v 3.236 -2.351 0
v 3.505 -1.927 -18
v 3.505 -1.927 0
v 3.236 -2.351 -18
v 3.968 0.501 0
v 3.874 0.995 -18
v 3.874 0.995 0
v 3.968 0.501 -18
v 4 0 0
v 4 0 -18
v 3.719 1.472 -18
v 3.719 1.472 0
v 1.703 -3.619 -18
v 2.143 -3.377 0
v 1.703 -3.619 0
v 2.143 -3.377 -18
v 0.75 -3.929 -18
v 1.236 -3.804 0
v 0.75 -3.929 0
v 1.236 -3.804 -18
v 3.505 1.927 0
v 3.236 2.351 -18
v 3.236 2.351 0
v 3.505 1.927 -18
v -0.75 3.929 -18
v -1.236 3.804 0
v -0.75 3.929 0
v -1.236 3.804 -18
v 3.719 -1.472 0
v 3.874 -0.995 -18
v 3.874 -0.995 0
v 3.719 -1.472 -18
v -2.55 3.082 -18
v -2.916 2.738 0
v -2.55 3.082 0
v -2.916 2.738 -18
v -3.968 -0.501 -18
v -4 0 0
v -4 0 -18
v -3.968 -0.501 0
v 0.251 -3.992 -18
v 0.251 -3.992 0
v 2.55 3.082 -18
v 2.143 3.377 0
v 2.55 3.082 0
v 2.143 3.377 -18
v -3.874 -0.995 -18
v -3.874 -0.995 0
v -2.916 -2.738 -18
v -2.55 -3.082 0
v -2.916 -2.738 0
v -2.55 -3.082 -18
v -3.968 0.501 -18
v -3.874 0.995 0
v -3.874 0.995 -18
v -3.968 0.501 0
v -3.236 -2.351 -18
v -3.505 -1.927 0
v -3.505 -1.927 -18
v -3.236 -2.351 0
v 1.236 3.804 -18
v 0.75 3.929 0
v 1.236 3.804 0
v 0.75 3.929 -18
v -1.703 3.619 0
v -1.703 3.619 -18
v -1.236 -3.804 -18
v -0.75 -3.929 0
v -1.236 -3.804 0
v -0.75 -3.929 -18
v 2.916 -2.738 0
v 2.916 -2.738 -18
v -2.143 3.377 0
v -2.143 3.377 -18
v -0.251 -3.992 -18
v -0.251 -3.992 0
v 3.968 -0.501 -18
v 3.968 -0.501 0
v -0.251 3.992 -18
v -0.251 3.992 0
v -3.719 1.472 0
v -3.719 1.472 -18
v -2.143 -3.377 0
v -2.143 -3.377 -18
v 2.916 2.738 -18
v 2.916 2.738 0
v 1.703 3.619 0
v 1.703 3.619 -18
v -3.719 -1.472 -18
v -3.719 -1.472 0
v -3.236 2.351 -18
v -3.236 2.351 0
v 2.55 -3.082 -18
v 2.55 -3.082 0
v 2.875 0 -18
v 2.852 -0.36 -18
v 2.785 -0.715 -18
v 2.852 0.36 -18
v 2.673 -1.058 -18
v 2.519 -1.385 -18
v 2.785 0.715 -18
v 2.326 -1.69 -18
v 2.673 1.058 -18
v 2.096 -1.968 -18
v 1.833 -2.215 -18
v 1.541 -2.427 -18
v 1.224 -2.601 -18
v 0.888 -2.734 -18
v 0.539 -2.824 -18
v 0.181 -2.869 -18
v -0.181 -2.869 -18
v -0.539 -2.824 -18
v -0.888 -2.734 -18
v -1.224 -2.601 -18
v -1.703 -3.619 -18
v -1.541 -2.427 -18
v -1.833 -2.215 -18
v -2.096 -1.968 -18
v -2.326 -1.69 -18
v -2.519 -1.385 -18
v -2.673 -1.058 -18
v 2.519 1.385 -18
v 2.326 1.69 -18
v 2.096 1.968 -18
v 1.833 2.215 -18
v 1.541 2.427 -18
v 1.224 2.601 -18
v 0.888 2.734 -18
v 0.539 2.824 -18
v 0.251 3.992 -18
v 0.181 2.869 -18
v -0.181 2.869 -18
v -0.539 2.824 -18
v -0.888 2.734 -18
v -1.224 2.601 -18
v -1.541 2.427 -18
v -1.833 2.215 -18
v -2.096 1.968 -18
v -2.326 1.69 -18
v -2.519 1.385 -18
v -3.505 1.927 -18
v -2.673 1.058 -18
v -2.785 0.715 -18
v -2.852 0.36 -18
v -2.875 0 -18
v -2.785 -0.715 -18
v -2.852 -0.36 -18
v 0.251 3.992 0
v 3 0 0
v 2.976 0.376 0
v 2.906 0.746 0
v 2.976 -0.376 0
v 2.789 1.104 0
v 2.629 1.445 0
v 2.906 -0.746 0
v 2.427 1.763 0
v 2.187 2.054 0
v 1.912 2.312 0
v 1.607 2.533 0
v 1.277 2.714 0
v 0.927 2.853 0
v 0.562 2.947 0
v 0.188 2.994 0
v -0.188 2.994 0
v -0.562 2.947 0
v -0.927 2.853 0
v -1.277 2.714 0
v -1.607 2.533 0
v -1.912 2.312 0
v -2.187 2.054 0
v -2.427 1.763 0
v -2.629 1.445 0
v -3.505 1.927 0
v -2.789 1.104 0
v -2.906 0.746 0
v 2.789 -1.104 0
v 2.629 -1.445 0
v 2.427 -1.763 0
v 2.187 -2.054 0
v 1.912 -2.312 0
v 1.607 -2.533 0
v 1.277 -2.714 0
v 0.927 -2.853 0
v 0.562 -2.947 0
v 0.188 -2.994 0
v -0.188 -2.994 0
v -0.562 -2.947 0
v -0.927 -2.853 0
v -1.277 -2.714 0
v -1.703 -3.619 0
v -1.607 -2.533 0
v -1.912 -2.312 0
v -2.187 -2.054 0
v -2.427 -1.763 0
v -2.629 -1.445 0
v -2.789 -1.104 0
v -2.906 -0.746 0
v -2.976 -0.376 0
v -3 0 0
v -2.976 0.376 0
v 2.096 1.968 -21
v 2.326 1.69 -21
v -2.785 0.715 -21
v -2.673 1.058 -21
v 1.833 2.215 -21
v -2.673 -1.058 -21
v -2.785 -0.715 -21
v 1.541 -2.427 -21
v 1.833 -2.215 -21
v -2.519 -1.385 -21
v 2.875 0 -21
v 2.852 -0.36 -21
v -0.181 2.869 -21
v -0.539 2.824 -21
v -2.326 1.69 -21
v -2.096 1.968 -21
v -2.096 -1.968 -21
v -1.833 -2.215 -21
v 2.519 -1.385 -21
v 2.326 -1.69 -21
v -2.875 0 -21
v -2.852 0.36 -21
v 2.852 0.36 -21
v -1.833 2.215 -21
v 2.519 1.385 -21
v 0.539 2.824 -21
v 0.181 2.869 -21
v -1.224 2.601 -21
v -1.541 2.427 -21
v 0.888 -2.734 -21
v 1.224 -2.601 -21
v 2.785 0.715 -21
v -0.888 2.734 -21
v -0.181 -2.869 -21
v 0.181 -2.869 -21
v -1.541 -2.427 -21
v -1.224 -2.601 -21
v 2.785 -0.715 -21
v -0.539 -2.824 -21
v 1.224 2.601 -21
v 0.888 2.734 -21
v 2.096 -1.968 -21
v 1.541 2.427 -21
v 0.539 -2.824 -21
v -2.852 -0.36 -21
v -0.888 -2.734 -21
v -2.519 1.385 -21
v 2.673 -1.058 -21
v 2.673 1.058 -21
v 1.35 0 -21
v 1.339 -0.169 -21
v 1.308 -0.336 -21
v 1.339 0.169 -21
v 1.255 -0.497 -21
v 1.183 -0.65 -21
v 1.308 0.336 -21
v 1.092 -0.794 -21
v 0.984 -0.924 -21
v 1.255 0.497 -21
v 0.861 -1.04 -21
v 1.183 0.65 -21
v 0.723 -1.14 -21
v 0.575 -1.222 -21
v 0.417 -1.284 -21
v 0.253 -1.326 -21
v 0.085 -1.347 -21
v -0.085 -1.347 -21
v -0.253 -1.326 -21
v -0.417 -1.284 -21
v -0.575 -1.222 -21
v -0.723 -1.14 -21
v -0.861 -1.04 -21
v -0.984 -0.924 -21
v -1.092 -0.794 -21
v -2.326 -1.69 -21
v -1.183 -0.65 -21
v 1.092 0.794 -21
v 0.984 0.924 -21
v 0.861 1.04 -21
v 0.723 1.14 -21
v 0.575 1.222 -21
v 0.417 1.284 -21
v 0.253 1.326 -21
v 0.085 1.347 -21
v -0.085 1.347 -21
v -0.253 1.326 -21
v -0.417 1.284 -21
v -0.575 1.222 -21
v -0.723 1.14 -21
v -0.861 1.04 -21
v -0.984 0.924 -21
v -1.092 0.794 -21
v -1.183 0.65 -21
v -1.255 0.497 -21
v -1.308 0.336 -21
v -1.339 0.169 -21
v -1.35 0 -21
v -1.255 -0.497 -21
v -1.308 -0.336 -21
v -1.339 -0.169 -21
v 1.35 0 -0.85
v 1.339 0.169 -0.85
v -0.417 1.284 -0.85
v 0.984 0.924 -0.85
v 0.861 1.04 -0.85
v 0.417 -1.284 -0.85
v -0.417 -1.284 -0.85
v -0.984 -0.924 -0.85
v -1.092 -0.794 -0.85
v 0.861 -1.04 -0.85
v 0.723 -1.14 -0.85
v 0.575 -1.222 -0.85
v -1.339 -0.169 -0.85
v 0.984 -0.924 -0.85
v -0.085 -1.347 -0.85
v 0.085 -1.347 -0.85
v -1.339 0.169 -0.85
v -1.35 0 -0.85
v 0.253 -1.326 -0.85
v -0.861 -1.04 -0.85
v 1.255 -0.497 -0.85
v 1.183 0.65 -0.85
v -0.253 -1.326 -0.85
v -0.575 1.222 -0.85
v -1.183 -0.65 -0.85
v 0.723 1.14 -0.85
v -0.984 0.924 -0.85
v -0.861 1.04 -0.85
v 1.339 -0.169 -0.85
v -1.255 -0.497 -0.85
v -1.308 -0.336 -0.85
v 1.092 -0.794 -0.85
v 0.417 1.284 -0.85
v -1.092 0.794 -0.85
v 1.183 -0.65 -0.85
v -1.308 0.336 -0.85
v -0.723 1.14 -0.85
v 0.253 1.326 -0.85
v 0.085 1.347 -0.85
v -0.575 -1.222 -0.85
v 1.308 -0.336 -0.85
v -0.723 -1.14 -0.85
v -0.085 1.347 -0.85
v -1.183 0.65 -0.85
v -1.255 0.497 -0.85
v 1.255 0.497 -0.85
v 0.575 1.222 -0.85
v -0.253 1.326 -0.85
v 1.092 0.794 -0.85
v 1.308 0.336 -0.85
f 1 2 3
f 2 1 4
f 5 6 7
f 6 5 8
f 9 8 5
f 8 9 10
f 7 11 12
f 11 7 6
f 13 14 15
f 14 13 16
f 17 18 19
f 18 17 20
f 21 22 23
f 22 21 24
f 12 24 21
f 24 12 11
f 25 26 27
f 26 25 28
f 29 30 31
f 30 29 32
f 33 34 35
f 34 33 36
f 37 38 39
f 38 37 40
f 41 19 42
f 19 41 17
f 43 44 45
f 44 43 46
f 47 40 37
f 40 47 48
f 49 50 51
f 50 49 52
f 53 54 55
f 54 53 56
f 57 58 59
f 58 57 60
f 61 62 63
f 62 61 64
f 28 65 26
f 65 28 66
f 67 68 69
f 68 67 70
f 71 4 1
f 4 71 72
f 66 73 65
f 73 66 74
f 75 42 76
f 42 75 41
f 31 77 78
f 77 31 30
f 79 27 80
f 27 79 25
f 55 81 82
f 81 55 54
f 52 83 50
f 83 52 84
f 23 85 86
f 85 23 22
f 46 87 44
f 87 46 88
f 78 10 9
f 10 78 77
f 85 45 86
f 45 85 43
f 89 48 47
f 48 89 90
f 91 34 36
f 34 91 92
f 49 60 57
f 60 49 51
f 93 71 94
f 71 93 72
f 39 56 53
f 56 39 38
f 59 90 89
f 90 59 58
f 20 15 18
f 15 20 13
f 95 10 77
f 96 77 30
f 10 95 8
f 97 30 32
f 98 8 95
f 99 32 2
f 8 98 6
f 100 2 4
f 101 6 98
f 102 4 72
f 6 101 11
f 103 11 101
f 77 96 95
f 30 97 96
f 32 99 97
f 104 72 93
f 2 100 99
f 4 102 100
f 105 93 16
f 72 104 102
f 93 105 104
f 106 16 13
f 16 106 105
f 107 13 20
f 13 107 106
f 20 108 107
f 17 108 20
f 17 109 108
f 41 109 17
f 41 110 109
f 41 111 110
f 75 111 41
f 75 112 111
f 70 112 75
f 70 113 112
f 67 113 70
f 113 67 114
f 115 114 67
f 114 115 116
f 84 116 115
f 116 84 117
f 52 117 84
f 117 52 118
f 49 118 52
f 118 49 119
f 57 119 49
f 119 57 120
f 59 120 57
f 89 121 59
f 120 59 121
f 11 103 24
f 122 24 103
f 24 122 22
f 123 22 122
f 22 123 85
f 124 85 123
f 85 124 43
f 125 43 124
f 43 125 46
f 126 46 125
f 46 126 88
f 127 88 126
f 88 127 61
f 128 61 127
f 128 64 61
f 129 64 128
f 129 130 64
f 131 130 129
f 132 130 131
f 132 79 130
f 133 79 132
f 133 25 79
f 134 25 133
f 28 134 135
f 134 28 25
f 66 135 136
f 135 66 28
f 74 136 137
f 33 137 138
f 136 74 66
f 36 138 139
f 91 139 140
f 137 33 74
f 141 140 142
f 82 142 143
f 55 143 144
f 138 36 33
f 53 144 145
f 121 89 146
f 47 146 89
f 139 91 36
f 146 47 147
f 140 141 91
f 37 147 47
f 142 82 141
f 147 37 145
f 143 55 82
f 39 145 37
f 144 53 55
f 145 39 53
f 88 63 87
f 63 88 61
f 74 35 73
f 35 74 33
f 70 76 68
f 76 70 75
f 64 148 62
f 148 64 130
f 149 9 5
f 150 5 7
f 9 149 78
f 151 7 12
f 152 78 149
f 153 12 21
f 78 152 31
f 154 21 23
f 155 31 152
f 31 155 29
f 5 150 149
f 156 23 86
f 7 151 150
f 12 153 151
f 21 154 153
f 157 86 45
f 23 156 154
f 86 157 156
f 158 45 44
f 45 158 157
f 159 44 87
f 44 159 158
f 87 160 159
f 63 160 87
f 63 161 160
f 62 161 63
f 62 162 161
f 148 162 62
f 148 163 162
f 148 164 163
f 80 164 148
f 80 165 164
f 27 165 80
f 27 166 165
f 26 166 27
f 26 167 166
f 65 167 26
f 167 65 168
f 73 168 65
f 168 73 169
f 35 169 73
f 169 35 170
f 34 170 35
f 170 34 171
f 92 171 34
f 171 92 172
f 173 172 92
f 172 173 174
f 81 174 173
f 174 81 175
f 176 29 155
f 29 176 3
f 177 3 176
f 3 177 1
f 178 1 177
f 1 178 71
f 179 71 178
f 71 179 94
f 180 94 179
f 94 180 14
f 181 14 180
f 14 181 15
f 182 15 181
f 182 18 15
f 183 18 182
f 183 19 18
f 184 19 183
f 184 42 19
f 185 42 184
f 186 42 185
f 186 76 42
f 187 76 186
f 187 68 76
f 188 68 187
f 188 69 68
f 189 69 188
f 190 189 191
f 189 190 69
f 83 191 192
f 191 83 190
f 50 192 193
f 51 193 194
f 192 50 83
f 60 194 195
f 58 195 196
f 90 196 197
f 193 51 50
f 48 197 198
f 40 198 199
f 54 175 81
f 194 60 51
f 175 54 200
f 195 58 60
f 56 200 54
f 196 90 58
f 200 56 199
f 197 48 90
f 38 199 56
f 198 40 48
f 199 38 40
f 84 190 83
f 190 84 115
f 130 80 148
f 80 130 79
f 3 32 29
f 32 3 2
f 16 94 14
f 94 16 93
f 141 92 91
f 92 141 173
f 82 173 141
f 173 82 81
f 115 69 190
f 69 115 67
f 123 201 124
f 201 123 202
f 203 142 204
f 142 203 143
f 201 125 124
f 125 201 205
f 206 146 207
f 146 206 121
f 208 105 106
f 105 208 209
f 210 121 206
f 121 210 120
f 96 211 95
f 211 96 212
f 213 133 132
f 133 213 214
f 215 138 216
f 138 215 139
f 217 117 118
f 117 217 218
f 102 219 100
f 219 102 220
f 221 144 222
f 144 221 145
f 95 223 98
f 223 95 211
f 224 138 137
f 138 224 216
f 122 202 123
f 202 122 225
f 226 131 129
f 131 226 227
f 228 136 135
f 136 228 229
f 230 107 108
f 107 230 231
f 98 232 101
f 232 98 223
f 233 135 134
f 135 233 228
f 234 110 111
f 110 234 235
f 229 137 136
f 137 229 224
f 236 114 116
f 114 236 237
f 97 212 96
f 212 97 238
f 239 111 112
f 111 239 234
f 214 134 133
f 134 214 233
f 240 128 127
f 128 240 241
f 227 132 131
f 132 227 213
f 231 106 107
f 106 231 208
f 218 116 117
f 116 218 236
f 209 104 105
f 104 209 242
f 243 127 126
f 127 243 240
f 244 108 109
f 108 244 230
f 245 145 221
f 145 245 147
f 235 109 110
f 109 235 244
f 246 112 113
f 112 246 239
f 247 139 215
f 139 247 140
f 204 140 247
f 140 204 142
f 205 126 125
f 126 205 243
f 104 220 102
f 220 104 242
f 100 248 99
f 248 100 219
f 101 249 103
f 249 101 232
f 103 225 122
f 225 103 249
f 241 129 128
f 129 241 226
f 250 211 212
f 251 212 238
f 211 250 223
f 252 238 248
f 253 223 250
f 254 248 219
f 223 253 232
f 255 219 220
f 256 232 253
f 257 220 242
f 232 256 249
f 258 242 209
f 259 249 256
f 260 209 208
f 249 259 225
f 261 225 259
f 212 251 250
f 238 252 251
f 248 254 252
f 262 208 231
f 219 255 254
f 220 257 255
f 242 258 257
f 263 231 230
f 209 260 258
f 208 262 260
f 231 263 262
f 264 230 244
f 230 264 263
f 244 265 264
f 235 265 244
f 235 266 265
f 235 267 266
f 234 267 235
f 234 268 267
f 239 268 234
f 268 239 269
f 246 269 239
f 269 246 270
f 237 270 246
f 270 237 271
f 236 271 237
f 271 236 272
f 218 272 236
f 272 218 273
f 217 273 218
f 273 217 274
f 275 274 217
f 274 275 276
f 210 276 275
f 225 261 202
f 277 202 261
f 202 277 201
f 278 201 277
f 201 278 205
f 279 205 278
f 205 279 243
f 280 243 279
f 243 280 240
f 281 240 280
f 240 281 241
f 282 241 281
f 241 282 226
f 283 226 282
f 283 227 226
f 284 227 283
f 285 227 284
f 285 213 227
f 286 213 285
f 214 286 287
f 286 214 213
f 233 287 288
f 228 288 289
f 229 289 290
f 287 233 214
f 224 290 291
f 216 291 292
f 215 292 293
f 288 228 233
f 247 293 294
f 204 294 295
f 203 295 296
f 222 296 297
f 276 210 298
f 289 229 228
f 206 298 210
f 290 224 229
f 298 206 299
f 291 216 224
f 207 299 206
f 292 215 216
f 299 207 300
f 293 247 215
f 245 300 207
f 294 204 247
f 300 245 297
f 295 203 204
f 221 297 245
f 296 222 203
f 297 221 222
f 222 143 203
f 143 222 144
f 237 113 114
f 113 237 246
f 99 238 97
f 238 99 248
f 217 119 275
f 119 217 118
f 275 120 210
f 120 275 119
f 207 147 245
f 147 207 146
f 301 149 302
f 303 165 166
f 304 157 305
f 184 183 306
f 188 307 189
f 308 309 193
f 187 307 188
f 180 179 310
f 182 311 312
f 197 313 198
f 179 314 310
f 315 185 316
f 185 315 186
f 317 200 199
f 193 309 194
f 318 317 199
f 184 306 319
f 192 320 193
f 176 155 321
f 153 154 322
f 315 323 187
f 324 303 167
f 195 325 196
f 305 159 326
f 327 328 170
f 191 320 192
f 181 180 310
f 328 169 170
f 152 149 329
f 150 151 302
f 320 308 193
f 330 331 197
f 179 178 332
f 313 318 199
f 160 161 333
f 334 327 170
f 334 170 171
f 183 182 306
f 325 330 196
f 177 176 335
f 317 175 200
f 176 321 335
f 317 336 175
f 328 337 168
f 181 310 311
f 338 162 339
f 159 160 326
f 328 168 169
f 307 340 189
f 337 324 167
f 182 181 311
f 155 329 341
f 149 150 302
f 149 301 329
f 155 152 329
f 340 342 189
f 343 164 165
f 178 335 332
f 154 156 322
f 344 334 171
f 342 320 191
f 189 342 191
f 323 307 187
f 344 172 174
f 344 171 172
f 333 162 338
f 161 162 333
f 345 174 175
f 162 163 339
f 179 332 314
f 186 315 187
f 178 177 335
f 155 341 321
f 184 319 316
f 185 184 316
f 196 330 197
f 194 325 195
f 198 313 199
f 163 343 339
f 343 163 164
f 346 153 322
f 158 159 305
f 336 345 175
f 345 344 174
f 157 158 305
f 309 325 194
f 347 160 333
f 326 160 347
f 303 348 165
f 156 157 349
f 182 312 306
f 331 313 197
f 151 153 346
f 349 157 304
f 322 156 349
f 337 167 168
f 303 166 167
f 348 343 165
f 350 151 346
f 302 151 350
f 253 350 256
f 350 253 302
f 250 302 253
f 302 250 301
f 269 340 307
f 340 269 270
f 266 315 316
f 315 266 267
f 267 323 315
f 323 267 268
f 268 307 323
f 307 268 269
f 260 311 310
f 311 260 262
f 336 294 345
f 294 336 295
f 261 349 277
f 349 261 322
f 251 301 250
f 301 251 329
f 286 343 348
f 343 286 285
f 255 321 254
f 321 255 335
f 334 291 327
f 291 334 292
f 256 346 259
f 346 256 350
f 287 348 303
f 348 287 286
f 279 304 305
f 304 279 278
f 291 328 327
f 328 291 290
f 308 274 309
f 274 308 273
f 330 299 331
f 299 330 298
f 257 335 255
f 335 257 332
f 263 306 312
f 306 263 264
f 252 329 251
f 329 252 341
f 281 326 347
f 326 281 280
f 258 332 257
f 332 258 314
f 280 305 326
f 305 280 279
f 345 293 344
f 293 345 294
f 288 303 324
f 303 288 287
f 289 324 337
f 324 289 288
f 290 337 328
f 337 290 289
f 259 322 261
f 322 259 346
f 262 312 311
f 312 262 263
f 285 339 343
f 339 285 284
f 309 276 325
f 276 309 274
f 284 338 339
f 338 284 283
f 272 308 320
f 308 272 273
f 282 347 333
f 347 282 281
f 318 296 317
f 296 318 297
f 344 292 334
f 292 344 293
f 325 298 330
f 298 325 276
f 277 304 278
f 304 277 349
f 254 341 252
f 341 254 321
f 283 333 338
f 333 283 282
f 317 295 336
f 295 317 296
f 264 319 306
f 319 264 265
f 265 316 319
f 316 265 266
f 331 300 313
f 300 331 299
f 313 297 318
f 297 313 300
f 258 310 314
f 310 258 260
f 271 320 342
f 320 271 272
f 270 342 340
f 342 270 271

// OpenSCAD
$fn = 50;

difference() {
	union() {
		translate(v = [0, 0, -18.0]) {
			cylinder(h = 18, r = 4.0);
		}
		#translate(v = [0, 0, -21.0]) {
			cylinder(h = 21, r = 2.875);
		}
	}
	union() {
		translate(v = [0, 0, 0]) {
			rotate(a = [0, 0, 0]) {
				difference() {
					union() {
						translate(v = [0, 0, -21.0]) {
							cylinder(h = 21, r = 1.0);
						}
						translate(v = [0, 0, -0.85]) {
							cylinder(h = 0.85, r1 = 1.35, r2 = 3.0);
						}
						translate(v = [0, 0, -21.0]) {
							cylinder(h = 21, r = 1.35);
						}
						translate(v = [0, 0, -21.0]) {
							cylinder(h = 21, r = 1.0);
						}
					}
					union();
				}
			}
		}
	}
}
